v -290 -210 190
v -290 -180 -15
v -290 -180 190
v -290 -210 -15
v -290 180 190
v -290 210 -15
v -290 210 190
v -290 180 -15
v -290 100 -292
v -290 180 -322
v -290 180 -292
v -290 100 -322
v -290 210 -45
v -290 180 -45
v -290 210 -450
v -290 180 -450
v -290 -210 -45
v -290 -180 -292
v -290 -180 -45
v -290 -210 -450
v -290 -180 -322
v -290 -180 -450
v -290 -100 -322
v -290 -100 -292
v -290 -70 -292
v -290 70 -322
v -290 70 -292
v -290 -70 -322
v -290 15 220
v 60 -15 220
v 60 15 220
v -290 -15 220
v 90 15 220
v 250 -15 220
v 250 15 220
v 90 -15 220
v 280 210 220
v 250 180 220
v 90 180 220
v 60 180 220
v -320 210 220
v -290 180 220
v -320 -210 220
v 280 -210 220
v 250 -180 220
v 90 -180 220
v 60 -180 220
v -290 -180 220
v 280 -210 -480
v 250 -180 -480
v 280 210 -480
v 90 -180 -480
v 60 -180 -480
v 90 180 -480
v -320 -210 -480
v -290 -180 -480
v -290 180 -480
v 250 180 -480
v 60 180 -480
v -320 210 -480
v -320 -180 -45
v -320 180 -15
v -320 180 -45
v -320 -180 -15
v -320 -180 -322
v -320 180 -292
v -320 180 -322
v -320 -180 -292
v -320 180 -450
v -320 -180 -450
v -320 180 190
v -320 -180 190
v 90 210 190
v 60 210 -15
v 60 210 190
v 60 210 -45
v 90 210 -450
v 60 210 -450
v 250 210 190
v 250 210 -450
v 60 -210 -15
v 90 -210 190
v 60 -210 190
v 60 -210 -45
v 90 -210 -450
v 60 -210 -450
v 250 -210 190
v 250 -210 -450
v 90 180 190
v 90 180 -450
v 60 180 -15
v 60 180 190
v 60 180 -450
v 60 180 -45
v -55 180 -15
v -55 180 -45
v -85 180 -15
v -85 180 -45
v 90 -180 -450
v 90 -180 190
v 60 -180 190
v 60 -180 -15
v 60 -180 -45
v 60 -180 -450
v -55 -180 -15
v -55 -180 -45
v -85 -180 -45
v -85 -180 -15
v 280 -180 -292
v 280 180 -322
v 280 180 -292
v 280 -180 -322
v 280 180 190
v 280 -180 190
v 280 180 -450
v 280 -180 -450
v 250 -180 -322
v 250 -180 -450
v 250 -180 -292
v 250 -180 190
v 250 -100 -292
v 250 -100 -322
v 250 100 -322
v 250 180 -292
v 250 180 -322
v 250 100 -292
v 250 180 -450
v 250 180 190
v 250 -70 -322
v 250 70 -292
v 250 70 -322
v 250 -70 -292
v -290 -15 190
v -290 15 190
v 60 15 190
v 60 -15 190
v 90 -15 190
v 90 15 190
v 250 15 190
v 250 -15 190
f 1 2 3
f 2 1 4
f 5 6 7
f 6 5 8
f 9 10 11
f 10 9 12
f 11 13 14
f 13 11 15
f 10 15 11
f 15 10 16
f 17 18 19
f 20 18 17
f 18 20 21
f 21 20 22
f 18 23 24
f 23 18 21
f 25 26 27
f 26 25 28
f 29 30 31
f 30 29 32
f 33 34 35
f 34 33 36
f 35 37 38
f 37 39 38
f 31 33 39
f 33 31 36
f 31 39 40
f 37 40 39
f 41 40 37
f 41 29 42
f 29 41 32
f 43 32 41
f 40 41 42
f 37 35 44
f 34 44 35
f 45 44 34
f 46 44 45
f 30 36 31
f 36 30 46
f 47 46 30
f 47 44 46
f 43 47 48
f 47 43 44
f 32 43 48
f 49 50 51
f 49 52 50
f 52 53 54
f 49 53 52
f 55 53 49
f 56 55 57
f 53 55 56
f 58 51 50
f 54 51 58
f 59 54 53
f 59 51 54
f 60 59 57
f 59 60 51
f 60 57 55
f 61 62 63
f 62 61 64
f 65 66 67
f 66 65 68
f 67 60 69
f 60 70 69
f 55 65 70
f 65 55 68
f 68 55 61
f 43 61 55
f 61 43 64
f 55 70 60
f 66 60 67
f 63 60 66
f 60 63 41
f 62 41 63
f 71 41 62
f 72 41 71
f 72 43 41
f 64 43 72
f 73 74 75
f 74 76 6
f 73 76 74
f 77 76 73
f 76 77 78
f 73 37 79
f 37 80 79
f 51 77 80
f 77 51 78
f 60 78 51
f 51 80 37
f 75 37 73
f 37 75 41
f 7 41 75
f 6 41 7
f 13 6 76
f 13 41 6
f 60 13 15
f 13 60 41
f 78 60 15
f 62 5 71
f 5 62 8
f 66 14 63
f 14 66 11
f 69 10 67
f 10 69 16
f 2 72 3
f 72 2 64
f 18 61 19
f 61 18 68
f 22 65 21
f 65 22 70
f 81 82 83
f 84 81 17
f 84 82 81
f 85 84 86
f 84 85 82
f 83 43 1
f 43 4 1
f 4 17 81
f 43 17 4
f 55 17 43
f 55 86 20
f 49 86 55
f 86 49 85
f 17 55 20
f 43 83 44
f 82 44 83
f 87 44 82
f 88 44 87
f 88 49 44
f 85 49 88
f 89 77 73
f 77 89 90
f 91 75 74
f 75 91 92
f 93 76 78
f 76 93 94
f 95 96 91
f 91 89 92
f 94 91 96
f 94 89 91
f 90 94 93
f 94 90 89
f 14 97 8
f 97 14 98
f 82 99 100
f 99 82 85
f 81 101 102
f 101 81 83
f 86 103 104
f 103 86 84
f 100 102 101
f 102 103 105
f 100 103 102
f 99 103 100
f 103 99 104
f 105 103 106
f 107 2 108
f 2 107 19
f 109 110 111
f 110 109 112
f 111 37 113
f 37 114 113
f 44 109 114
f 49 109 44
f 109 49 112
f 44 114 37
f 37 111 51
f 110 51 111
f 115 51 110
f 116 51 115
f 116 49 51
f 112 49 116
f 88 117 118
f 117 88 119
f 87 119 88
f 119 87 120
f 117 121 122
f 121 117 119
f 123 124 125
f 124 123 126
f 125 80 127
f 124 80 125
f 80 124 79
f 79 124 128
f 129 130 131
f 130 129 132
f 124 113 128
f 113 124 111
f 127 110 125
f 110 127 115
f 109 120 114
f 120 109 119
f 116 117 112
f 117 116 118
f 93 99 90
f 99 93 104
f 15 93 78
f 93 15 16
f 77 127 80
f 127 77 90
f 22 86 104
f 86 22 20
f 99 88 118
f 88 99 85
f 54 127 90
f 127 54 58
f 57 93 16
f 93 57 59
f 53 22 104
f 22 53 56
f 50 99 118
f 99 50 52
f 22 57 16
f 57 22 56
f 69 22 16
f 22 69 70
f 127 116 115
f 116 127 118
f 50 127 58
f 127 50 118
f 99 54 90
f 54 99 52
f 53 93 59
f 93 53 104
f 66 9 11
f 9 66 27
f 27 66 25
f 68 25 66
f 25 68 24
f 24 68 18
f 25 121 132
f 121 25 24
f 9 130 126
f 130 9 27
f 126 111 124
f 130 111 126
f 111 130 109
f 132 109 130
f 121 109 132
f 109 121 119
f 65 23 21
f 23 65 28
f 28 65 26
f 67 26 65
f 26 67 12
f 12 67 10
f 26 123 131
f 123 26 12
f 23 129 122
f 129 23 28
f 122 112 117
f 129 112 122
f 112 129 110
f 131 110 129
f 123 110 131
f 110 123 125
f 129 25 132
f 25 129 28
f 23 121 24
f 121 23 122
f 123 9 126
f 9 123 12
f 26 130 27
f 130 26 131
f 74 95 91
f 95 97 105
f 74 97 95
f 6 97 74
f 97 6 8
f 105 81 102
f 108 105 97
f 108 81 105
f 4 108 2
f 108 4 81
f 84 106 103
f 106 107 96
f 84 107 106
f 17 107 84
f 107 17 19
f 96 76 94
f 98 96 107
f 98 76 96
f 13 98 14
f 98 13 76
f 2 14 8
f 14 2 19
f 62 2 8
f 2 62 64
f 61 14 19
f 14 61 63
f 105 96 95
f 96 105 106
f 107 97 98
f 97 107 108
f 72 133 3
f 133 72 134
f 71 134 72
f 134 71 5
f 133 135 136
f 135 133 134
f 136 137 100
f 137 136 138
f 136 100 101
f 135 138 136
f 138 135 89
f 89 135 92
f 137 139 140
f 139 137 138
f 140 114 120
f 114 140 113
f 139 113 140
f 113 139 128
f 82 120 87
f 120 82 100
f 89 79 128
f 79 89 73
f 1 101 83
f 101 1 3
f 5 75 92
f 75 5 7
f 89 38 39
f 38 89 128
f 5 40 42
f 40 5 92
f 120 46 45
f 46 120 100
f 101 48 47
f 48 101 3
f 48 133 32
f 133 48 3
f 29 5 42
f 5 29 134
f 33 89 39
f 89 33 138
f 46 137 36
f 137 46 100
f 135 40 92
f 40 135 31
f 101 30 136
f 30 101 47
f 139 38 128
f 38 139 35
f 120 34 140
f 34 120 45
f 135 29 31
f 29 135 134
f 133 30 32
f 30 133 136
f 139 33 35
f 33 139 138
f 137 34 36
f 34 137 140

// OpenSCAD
// file: _params.scad
// =========================================================================
// 공유 파라미터 (모든 개별 부품 파일에서 include)
// 메인 어셈블리: cup_z_x_catrage_frame_water_mic_anti_3030.scad 에서 추출
// 프레임: 600 × 420 × 700mm (3030 프로파일, Y=0 대칭)
// =========================================================================

$fn = 60;  // 부품 출력용 고해상도
GLOBAL_TOLERANCE = 0.2;

// --- [1] 하부 기성품 및 원통 파라미터 ---
X_RAIL_LEN = 290.0;
X_BLOCK_W = 30.0; X_BLOCK_L = 32.0;   // 신규 X슬라이더 블록 (폭 30mm × 길이 32mm)
X_PITCH_X = 20.0; X_PITCH_Y = 20.0;   // 체결 홀 피치 (20 × 20mm, M3 나사탭 4개)
X_RAIL_W = 30.0;  X_RAIL_H = 20.0;   // 레일 폭 30mm (레일 바닥~블록 윗면 높이 29mm 반영)
X_TOTAL_H = 29.0;                    // 레일 바닥에서 슬라이더 블록 윗면까지의 높이

MOTOR_W = 42.0;      MOTOR_PITCH = 31.0; MOTOR_HOLE_D = 3.5;    
MOTOR_BOSS_D = 22.0; MOTOR_BOSS_H = 2.0; SCREW_D = 8.0;         
MOT_BODY_L = 41.0;   SHAFT_L = 24.0;     // 실측 NEMA17 몸통 41mm / 축 돌출 24mm

CUP_ID = 99.5;  CUP_WALL = 5.0; CUP_OD = 110.0;     // 아크릴 원통 OD110/ID100
CUP_H = 180.0;   CAGE_H = 60.0;  FLOOR_H = 10.0; PISTON_H = 20.0;     

LIP_D = 30.0;    LIP_H = 5.0;    LEAK_DRAIN_D = 4.0;    
GUIDE_PIPE_D = 8.0; BUSHING_OD = 12.0; BUSHING_H = 8.0;       
DRAIN_RADIUS = 35.0; DRAIN_D = 8.0;        

Y_OFFSET = 85.0; BRKT_H = 12.0; BRKT_D = 122.0; BRKT_ID = 62.0; Z_MOUNT_PCD = 86.0;   

// --- [2] 아크릴 파이프 및 상부 카트리지 ---
ACRYL_ID = 100.0; ACRYL_T = 5.0; ACRYL_OD = ACRYL_ID + (ACRYL_T * 2);  // OD110 (아크릴집 106 재고없음 → 컵과 동일 규격)

REVOLVER_PCD = 240.0;     // 인접 카트리지 웹 9.8mm 확보 (OD110 대응, 230→240)
CARTRIDGE_OD = REVOLVER_PCD + ACRYL_OD + 8; 
TOP_PLATE_H = 15.0;       // 아크릴 15T 통판 (보스홀 단 깊이 10mm)

HUB_D = 60.0;            
SHAFT_D = 12.0;          
HUB_WALL = 4.0;          
HUB_H = 15.0;             // 아크릴 5T × 3장 적층 — 파이프 130mm 대응
POCKET_DEPTH = 5.0;
MID_HUB_Z = 63.5;          // 중단 허브 하면 Z (벨트 중심 Z=71.0mm 정렬, 풀리 상단 Z=75.0mm = 축상단-1mm)
UPPER_HUB_Z = 135.0;       // 상단 허브 하면 Z (전체 135+15=150 유지)
BOSS_OD = 35.0;
BOSS_H = 11.0;             // 보스11 + 와셔1 = 12, 리세스10 → 허브 2mm 공중

// --- [3] GT2 벨트 구동 시스템 ---
GT2_PITCH     = 2.0;
GT2_BELT_W    = 6.0;
BIG_PULLEY_TEETH = 566;
BIG_PULLEY_PD = BIG_PULLEY_TEETH * GT2_PITCH / PI;
BIG_PULLEY_OD = BIG_PULLEY_PD + 1.0;
SMALL_PULLEY_TEETH = 20;
SMALL_PULLEY_PD = SMALL_PULLEY_TEETH * GT2_PITCH / PI;
SMALL_PULLEY_OD = SMALL_PULLEY_PD + 1.0;

BELT_MOTOR_X = -300;
BELT_MOTOR_Y = -155.5;
BRKT_MOTOR_H = 25.0;
BRKT_MOTOR_W = 45.0;        // 브래킷 폭 45mm (프로파일 간섭 회피 복원)
SLOT_LEN = 10.0;
FLAG_W = 15.0;  FLAG_H = 8.0;  FLAG_T = 1.5;

X_POS_MEASURE = 170.0;   // 측정 브래킷 X좌표 (X_M~X_R 정중앙, X대칭)

// --- [4] 3030 프레임 경계 (600×430×700mm) ---
PF = 30;             // 3030 알루미늄 프로파일
WASHER_T = 1.0;     

X_L = -320;
X_M = 60;
X_R = 250;
Y_F = -210;          // 전방 (대칭: -210+30=-180, Y=0 중심)
Y_B = 180;           // 후방 (대칭: 180+30=210, Y=0 중심) — 메인파일과 동기화

Z_BOT = -480;
Z_RAIL = -322;
Z_MID = -TOP_PLATE_H - PF;
Z_TOP = 220;

SUPPORT_PILLAR_H = Z_TOP - PF;

SHAFT_SQ = 20;       // 2020 사각 회전축

// 사각 축 홀 크기
SQ = SHAFT_SQ + GLOBAL_TOLERANCE;  // 20.2mm

// --- 리볼버/컵 축 정렬 (보스홀=판 중심에 리볼버 정렬) ---
REVOLVER_CX = (X_L + X_M + PF)/2;        // 판 중심 = 보스홀 = 리볼버 회전축 (-115)
DROP_X      = REVOLVER_CX + REVOLVER_PCD/2;  // 링 드롭 / 컵 적재 축 (+5)

FLANGE_Z = 52.0;       // 모터 전면 안착 높이 (Z=52mm -> 축 상단 Z=76mm, 풀리 결합)

// --- [5] 모터 체결홀 (이미 제작 완료된 15T 상판 원본 도면 수치 100% 유지) ---
MOTOR_BOLT_PITCH     = 25.0;      // Y피치 (Y = ±12.5mm)
MOTOR_BOLT_X_NOMINAL = X_L + 55;  // 1열: 상판 좌단 55 (모터축 기준 +35mm = X=-265mm)
MOTOR_BOLT_X_SHIFT   = X_L + 40;  // 2열: 상판 좌단 40 (모터축 기준 +20mm = X=-280mm)

// 모터 마운트 볼트 카운터보어 (단볼트용 — 브래킷 두께 25 중 깊게 파냄)
MOTOR_CB_D     = 6.5;            // M3 캡볼트 머리 클리어런스
MOTOR_CB_DEPTH = 19;             // 카운터보어 깊이 (잔여 통과 6mm → M3×10 단볼트)
// main file
// =========================================================================
// [외주] 2020 알루미늄 프로파일 프레임 어셈블리 (구버전 참고용)
// 메인 파일 aluminum_profile_frame() 모듈에서 추출
// 기둥 6본 + 하부/중부/레일/상부 보 다수
// =========================================================================
include <_params.scad>

module aluminum_profile_frame() { 
    // ── 기둥 6본 (수직) ──
    color([0.75, 0.75, 0.75]) { 
        translate([X_L, Y_B, Z_BOT]) cube([PF, PF, Z_TOP - Z_BOT]);
        translate([X_L, Y_F, Z_BOT]) cube([PF, PF, Z_TOP - Z_BOT]); 
        translate([X_M, Y_B, Z_BOT]) cube([PF, PF, Z_TOP - Z_BOT]);
        translate([X_M, Y_F, Z_BOT]) cube([PF, PF, Z_TOP - Z_BOT]); 
        translate([X_R, Y_B, Z_BOT]) cube([PF, PF, Z_TOP - Z_BOT]);
        translate([X_R, Y_F, Z_BOT]) cube([PF, PF, Z_TOP - Z_BOT]); 
    } 
    // ── 하부 보 (Z_BOT) ──
    color([0.65, 0.65, 0.65]) { 
        translate([X_L + PF, Y_B, Z_BOT]) cube([X_R - X_L - PF, PF, PF]);
        translate([X_L + PF, Y_F, Z_BOT]) cube([X_R - X_L - PF, PF, PF]); 
        translate([X_L, Y_F + PF, Z_BOT]) cube([PF, Y_B - Y_F - PF, PF]);
        translate([X_R, Y_F + PF, Z_BOT]) cube([PF, Y_B - Y_F - PF, PF]);
        translate([X_M, Y_F + PF, Z_BOT]) cube([PF, Y_B - Y_F - PF, PF]); 
    } 
    // ── 레일 보 (Z_RAIL) ──
    color([0.8, 0.8, 0.8]) { 
        translate([X_L, -Y_OFFSET - PF/2, Z_RAIL]) cube([X_R - X_L + PF, PF, PF]);
        translate([X_L, Y_OFFSET - PF/2, Z_RAIL]) cube([X_R - X_L + PF, PF, PF]); 
        translate([X_L, Y_F + PF, Z_RAIL]) cube([PF, Y_B - Y_F - PF, PF]);
        translate([X_R, Y_F + PF, Z_RAIL]) cube([PF, Y_B - Y_F - PF, PF]);
    } 
    // ── 중부 보 (Z_MID = 상판 하면) ──
    color([0.7, 0.7, 0.7]) { 
        translate([X_L + PF, Y_B, Z_MID]) cube([X_M - X_L - PF, PF, PF]);
        translate([X_L + PF, Y_F, Z_MID]) cube([X_M - X_L - PF, PF, PF]); 
        translate([X_L, Y_F + PF, Z_MID]) cube([PF, Y_B - Y_F - PF, PF]);
        translate([-85, Y_F + PF, Z_MID]) cube([PF, Y_B - Y_F - PF, PF]); 
    } 
    // ── 상부 보 (Z_TOP - PF) ──
    color([0.75, 0.75, 0.75]) { 
        translate([X_L + PF, Y_B, Z_TOP - PF]) cube([X_R - X_L - PF, PF, PF]);
        translate([X_L + PF, Y_F, Z_TOP - PF]) cube([X_R - X_L - PF, PF, PF]); 
        translate([X_L, Y_F + PF, Z_TOP - PF]) cube([PF, Y_B - Y_F - PF, PF]);
        translate([X_M, Y_F + PF, Z_TOP - PF]) cube([PF, Y_B - Y_F - PF, PF]);
        translate([X_R, Y_F + PF, Z_TOP - PF]) cube([PF, Y_B - Y_F - PF, PF]); 
    } 
    // ── 리볼버 축 보 (Y=0 중심) ──
    color([0.65, 0.65, 0.65]) { 
        translate([X_L + PF, -PF/2, Z_TOP - PF]) cube([X_M - X_L - PF, PF, PF]);
    } 
    // ── 측정 브래킷 장착용 가로보 ──
    color([0.75, 0.75, 0.75]) { 
        translate([X_M + PF, -PF/2, Z_TOP - PF]) cube([X_R - X_M - PF, PF, PF]); 
    } 
}

aluminum_profile_frame();
